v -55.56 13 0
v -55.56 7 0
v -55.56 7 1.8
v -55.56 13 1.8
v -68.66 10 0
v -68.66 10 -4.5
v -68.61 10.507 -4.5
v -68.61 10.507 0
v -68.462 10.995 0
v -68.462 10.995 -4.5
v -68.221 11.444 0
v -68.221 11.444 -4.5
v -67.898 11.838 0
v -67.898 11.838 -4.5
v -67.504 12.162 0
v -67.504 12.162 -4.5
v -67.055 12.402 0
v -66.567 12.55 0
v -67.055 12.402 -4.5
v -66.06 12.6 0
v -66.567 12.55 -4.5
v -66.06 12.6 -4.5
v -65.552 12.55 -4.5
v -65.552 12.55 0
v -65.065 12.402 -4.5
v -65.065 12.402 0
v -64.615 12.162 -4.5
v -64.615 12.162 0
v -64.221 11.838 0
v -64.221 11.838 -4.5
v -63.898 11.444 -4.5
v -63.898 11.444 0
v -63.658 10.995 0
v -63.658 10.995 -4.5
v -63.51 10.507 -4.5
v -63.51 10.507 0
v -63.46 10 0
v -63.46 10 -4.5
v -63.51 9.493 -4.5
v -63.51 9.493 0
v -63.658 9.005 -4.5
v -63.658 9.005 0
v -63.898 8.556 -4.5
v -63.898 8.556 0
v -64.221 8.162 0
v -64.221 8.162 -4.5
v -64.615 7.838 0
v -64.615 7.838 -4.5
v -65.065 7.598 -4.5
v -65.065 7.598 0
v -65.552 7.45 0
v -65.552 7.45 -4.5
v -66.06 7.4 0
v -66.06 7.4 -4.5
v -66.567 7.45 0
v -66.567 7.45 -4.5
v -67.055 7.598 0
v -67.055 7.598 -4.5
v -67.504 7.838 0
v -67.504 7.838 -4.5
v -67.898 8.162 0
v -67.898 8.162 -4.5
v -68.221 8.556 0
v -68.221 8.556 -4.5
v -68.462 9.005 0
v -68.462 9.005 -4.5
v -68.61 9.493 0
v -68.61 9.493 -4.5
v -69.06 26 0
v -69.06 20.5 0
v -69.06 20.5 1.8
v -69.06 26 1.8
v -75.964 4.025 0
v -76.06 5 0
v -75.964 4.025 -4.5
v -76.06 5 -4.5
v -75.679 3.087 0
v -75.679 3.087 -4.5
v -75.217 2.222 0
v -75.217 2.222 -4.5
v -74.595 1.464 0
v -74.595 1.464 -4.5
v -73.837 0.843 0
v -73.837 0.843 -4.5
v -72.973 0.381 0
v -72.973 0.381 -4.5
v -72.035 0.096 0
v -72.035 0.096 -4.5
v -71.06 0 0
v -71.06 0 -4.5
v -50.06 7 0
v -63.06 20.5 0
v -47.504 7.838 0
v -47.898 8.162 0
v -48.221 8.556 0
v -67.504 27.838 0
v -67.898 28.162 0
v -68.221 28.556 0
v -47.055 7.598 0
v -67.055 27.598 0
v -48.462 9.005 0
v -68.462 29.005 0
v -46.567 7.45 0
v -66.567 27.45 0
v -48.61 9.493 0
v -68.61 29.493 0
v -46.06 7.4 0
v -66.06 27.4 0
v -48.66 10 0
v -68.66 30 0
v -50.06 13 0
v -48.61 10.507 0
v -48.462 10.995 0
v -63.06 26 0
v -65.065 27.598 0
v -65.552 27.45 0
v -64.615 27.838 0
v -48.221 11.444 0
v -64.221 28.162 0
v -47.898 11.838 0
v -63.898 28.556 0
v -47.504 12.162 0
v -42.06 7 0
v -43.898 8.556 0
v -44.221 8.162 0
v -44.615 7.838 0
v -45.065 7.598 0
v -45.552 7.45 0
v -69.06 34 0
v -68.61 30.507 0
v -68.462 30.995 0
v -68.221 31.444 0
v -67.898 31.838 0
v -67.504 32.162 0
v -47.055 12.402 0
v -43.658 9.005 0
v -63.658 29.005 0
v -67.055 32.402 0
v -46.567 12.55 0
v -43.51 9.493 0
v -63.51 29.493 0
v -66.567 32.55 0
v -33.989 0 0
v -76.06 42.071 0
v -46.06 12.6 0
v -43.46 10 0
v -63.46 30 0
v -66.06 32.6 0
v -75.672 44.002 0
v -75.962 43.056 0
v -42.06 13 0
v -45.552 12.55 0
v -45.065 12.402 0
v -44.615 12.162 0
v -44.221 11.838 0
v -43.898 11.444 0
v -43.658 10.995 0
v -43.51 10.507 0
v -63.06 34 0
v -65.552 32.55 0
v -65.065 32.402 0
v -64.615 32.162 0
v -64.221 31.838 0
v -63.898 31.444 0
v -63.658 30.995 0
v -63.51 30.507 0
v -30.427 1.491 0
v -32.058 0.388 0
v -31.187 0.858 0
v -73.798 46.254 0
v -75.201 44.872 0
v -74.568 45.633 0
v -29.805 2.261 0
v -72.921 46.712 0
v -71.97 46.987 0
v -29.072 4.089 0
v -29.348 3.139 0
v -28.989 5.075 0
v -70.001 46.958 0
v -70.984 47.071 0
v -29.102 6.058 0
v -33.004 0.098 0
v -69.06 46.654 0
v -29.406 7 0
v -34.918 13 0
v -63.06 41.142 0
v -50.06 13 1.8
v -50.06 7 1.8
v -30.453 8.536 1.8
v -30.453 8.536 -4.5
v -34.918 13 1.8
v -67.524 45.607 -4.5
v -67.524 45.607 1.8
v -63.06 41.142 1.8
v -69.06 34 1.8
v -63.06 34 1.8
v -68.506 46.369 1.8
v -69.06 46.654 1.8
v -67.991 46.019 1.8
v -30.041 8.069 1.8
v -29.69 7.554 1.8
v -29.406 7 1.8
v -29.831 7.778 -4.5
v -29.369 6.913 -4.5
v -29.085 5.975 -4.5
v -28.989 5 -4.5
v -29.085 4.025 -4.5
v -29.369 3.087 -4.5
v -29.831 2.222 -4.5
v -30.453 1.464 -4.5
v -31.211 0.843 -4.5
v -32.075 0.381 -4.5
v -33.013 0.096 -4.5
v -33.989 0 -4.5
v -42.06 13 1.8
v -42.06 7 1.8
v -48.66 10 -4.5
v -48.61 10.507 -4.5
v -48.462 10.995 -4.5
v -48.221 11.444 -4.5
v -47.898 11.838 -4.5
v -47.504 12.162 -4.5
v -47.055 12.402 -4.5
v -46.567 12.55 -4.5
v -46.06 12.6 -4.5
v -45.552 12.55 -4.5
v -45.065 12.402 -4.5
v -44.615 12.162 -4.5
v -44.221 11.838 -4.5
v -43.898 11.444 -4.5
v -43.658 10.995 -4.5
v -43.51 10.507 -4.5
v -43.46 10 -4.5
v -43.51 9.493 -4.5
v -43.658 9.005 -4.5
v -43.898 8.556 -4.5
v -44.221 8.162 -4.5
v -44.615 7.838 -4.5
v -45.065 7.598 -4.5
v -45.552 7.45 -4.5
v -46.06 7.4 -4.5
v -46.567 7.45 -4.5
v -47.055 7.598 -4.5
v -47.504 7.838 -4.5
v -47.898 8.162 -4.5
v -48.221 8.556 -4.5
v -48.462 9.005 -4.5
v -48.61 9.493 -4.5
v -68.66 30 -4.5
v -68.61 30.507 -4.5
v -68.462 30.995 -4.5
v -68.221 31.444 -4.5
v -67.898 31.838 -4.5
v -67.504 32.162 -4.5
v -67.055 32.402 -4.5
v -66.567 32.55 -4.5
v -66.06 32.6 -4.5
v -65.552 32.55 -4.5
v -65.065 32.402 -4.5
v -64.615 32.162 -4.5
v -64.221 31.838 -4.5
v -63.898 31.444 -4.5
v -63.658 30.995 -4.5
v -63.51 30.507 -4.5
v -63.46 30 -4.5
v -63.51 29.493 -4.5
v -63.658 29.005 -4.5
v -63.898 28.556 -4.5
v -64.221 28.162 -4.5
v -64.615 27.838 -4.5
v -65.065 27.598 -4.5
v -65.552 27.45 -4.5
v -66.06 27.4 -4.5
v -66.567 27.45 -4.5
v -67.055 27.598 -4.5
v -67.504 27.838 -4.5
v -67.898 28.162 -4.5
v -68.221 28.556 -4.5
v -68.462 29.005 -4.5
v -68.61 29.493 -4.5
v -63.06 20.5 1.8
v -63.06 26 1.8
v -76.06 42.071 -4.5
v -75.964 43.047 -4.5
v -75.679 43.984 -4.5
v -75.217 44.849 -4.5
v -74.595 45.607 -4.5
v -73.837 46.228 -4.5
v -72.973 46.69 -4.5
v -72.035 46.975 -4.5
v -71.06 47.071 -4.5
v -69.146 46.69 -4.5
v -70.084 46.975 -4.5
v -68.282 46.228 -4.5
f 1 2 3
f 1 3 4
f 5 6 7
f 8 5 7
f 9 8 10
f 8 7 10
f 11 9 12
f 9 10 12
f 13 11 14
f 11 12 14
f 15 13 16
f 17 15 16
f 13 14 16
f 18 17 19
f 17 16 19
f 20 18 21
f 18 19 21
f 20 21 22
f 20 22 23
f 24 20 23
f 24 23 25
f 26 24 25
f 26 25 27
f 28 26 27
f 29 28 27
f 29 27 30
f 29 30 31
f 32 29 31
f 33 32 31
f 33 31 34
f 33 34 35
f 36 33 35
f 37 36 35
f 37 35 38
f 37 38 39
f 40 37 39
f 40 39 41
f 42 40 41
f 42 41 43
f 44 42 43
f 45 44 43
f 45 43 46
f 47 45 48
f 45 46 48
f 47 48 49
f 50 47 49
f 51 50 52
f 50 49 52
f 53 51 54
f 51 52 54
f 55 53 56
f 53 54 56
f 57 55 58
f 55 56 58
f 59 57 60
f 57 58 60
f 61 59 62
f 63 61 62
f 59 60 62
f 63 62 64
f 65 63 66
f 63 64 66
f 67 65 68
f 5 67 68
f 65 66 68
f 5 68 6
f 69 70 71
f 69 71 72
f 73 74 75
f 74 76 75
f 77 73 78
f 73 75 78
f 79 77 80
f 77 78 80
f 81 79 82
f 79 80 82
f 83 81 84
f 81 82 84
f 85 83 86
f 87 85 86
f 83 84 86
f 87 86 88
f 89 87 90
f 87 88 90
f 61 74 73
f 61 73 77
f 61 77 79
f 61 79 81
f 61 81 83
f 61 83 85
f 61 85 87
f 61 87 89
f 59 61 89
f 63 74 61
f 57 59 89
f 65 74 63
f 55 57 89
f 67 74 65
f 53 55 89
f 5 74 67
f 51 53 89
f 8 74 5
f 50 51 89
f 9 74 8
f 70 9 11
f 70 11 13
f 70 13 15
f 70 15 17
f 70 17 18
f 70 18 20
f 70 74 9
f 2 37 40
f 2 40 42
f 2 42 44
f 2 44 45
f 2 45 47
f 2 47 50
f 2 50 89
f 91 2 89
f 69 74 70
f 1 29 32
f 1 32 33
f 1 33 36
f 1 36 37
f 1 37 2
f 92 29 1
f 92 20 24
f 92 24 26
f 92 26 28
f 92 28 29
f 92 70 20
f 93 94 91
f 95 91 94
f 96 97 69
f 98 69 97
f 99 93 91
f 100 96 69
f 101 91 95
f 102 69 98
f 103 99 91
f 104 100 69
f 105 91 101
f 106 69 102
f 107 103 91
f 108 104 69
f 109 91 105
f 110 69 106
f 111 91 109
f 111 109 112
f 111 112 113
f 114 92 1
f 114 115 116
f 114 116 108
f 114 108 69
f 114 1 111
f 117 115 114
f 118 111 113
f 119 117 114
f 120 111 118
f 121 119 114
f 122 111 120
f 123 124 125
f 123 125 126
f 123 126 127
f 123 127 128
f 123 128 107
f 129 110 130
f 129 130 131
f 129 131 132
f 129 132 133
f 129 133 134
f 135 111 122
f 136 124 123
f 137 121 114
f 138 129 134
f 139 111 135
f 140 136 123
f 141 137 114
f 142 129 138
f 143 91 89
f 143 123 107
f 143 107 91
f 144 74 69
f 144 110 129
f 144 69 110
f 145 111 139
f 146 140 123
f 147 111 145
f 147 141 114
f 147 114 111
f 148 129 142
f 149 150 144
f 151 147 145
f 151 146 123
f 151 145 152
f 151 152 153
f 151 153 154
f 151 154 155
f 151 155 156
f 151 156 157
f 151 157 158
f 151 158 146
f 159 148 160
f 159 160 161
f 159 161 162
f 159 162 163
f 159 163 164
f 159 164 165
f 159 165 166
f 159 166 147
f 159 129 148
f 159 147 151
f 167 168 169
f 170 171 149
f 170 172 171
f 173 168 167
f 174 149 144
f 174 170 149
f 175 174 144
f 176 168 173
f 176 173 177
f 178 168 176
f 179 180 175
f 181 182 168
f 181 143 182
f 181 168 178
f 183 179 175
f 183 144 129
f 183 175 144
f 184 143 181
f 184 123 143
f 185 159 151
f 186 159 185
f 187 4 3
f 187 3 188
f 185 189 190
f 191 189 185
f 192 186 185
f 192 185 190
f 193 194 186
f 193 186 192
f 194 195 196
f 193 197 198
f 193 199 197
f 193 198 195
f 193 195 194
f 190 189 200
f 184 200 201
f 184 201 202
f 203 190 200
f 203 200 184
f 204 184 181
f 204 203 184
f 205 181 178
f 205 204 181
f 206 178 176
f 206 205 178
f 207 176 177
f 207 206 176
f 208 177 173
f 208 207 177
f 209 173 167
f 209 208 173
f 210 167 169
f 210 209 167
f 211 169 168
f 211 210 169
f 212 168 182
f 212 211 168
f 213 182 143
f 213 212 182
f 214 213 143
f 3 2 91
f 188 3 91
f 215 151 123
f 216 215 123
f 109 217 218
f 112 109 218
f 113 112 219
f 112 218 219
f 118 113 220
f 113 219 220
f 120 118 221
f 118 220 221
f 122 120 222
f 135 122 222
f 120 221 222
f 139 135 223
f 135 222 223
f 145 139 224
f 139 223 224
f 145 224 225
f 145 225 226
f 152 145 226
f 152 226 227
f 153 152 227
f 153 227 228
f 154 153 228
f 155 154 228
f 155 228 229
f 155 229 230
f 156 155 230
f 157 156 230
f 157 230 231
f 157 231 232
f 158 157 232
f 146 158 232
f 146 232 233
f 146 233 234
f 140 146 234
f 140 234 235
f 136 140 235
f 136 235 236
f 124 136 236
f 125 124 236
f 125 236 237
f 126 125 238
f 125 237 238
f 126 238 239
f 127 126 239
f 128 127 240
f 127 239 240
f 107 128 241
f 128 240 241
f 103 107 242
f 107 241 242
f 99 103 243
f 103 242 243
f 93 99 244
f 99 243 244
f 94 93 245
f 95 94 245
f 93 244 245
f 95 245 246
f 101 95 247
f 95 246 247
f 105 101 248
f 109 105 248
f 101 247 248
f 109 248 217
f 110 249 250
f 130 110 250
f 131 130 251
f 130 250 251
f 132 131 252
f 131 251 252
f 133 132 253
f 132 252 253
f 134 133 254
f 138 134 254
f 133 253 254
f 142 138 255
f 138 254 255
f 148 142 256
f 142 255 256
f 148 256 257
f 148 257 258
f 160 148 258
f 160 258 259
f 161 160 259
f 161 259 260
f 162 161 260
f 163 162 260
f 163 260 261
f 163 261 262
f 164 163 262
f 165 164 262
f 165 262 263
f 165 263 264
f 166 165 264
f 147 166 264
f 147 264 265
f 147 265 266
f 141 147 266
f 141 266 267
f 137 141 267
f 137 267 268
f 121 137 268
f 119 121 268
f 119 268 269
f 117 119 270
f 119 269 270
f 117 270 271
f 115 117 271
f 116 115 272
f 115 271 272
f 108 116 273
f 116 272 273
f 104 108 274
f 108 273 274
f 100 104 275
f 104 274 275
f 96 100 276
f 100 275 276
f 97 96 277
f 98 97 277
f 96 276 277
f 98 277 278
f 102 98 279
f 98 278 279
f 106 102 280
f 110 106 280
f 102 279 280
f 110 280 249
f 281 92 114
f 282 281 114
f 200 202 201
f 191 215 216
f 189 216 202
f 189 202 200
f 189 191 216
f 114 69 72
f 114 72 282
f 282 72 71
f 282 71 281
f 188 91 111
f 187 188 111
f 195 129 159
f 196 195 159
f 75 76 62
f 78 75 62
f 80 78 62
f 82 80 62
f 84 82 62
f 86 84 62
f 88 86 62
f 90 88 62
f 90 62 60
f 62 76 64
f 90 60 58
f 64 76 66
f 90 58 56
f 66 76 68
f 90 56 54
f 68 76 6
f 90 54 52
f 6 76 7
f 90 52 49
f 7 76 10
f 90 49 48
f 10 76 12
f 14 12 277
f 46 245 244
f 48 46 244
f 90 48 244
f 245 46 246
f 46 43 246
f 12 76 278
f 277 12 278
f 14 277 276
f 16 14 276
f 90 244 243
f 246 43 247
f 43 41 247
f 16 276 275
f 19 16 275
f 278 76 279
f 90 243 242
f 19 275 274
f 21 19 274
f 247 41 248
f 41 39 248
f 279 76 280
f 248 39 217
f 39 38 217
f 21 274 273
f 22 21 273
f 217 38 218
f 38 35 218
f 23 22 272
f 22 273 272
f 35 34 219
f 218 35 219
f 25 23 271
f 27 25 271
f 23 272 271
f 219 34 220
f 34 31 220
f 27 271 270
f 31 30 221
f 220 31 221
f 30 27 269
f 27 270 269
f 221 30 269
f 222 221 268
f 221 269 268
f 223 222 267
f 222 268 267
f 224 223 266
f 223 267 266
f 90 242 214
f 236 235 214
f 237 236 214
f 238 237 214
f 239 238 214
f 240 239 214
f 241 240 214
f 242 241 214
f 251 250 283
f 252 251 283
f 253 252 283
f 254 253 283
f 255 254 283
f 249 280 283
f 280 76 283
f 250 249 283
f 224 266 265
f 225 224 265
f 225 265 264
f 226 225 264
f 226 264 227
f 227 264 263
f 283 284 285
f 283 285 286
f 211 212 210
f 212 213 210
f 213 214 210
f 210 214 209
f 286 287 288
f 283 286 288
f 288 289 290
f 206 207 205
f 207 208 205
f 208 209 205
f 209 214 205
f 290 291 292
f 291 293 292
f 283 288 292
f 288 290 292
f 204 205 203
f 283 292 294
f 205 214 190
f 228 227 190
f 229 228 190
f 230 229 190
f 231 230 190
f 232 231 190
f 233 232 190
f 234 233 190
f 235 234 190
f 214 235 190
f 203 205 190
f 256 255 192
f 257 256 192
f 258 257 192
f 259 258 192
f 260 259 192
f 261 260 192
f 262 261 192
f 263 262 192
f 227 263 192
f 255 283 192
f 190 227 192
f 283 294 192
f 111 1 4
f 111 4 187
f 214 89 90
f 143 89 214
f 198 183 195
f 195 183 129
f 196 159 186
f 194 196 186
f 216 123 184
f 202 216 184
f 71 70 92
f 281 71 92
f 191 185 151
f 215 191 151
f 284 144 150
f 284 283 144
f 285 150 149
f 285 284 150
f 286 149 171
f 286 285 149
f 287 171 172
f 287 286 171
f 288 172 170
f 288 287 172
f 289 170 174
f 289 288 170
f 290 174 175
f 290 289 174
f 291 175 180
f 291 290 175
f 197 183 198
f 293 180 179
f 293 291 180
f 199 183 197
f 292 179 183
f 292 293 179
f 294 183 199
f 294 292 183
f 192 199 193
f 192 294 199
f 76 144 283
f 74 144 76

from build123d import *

# Parameters (mm, degrees)
F0_W     = 6
F0_H     = 8
F0_H_2   = 5.5
F0_H_3   = 7.5
F0_W_2   = 7
F0_H_4   = 6
F0_W_3   = 7.5
F0_W_4   = 5.5
F0_W_5   = 8
F0_H_5   = 7
F1_DEPTH = 4.5
F2_DEPTH = 1.8
F3_D     = 5.2
F4_R     = 5


with BuildPart() as f1:
    # F0 (on Top) → F1 (new body)
    with BuildSketch(Plane.XY):
        Polygon((-69.0596391448, 47.1421356237), (-76.0596391448, 54.1421356237), (-76.0596391448, 13), (-69.0596391448, 13), (-69.0596391448, 20.5), (-69.0596391448, 26), (-69.0596391448, 34), align=None)
        Polygon((-63.0596391448, 41.1421356237), (-69.0596391448, 47.1421356237), (-69.0596391448, 34), (-63.0596391448, 34), align=None)
        with Locations((-66.0596391448, 30)):
            Rectangle(F0_W, F0_H)
        with Locations((-66.0596391448, 23.25)):
            Rectangle(F0_W, F0_H_2)
        with Locations((-66.0596391448, 16.75)):
            Rectangle(F0_W, F0_H_3)
        Polygon((-34.9175035211, 13), (-63.0596391448, 41.1421356237), (-63.0596391448, 34), (-63.0596391448, 26), (-63.0596391448, 20.5), (-63.0596391448, 13), (-55.5596391448, 13), (-50.0596391448, 13), (-42.0596391448, 13), align=None)
        with Locations((-72.5596391448, 10)):
            Rectangle(F0_W_2, F0_H_4)
        with Locations((-66.0596391448, 10)):
            Rectangle(F0_W, F0_H_4)
        with Locations((-59.3096391448, 10)):
            Rectangle(F0_W_3, F0_H_4)
        with Locations((-52.8096391448, 10)):
            Rectangle(F0_W_4, F0_H_4)
        with Locations((-46.0596391448, 10)):
            Rectangle(F0_W_5, F0_H_4)
        Polygon((-28.9175035211, 7), (-34.9175035211, 13), (-42.0596391448, 13), (-42.0596391448, 7), align=None)
        Polygon((-55.5596391448, 7), (-63.0596391448, 7), (-63.0596391448, 0), (-21.9175035211, 0), (-28.9175035211, 7), (-42.0596391448, 7), (-50.0596391448, 7), align=None)
        with Locations((-66.0596391448, 3.5)):
            Rectangle(F0_W, F0_H_5)
        with Locations((-72.5596391448, 3.5)):
            Rectangle(F0_W_2, F0_H_5)
    extrude(amount=-F1_DEPTH)

    # F0 (on Top) → F2 (join)
    with BuildSketch(Plane.XY):
        Polygon((-63.0596391448, 41.1421356237), (-69.0596391448, 47.1421356237), (-69.0596391448, 34), (-63.0596391448, 34), align=None)
        with Locations((-66.0596391448, 23.25)):
            Rectangle(F0_W, F0_H_2)
        with Locations((-52.8096391448, 10)):
            Rectangle(F0_W_4, F0_H_4)
        Polygon((-28.9175035211, 7), (-34.9175035211, 13), (-42.0596391448, 13), (-42.0596391448, 7), align=None)
    extrude(amount=F2_DEPTH)

    # F3 (through all)
    with Locations(Plane.XY):
        with Locations((-66.0596391448, 30), (-66.0596391448, 10), (-46.0596391448, 10)):
            Hole(F3_D / 2)

    # F4
    f4_edges = [f1.edges().sort_by_distance(p)[0] for p in [
        (-21.917504, 0, -2.25),
        (-76.059639, 0, -2.25),
        (-76.059639, 54.142136, -2.25),
    ]]
    fillet(f4_edges, radius=F4_R)


solid = f1.part
